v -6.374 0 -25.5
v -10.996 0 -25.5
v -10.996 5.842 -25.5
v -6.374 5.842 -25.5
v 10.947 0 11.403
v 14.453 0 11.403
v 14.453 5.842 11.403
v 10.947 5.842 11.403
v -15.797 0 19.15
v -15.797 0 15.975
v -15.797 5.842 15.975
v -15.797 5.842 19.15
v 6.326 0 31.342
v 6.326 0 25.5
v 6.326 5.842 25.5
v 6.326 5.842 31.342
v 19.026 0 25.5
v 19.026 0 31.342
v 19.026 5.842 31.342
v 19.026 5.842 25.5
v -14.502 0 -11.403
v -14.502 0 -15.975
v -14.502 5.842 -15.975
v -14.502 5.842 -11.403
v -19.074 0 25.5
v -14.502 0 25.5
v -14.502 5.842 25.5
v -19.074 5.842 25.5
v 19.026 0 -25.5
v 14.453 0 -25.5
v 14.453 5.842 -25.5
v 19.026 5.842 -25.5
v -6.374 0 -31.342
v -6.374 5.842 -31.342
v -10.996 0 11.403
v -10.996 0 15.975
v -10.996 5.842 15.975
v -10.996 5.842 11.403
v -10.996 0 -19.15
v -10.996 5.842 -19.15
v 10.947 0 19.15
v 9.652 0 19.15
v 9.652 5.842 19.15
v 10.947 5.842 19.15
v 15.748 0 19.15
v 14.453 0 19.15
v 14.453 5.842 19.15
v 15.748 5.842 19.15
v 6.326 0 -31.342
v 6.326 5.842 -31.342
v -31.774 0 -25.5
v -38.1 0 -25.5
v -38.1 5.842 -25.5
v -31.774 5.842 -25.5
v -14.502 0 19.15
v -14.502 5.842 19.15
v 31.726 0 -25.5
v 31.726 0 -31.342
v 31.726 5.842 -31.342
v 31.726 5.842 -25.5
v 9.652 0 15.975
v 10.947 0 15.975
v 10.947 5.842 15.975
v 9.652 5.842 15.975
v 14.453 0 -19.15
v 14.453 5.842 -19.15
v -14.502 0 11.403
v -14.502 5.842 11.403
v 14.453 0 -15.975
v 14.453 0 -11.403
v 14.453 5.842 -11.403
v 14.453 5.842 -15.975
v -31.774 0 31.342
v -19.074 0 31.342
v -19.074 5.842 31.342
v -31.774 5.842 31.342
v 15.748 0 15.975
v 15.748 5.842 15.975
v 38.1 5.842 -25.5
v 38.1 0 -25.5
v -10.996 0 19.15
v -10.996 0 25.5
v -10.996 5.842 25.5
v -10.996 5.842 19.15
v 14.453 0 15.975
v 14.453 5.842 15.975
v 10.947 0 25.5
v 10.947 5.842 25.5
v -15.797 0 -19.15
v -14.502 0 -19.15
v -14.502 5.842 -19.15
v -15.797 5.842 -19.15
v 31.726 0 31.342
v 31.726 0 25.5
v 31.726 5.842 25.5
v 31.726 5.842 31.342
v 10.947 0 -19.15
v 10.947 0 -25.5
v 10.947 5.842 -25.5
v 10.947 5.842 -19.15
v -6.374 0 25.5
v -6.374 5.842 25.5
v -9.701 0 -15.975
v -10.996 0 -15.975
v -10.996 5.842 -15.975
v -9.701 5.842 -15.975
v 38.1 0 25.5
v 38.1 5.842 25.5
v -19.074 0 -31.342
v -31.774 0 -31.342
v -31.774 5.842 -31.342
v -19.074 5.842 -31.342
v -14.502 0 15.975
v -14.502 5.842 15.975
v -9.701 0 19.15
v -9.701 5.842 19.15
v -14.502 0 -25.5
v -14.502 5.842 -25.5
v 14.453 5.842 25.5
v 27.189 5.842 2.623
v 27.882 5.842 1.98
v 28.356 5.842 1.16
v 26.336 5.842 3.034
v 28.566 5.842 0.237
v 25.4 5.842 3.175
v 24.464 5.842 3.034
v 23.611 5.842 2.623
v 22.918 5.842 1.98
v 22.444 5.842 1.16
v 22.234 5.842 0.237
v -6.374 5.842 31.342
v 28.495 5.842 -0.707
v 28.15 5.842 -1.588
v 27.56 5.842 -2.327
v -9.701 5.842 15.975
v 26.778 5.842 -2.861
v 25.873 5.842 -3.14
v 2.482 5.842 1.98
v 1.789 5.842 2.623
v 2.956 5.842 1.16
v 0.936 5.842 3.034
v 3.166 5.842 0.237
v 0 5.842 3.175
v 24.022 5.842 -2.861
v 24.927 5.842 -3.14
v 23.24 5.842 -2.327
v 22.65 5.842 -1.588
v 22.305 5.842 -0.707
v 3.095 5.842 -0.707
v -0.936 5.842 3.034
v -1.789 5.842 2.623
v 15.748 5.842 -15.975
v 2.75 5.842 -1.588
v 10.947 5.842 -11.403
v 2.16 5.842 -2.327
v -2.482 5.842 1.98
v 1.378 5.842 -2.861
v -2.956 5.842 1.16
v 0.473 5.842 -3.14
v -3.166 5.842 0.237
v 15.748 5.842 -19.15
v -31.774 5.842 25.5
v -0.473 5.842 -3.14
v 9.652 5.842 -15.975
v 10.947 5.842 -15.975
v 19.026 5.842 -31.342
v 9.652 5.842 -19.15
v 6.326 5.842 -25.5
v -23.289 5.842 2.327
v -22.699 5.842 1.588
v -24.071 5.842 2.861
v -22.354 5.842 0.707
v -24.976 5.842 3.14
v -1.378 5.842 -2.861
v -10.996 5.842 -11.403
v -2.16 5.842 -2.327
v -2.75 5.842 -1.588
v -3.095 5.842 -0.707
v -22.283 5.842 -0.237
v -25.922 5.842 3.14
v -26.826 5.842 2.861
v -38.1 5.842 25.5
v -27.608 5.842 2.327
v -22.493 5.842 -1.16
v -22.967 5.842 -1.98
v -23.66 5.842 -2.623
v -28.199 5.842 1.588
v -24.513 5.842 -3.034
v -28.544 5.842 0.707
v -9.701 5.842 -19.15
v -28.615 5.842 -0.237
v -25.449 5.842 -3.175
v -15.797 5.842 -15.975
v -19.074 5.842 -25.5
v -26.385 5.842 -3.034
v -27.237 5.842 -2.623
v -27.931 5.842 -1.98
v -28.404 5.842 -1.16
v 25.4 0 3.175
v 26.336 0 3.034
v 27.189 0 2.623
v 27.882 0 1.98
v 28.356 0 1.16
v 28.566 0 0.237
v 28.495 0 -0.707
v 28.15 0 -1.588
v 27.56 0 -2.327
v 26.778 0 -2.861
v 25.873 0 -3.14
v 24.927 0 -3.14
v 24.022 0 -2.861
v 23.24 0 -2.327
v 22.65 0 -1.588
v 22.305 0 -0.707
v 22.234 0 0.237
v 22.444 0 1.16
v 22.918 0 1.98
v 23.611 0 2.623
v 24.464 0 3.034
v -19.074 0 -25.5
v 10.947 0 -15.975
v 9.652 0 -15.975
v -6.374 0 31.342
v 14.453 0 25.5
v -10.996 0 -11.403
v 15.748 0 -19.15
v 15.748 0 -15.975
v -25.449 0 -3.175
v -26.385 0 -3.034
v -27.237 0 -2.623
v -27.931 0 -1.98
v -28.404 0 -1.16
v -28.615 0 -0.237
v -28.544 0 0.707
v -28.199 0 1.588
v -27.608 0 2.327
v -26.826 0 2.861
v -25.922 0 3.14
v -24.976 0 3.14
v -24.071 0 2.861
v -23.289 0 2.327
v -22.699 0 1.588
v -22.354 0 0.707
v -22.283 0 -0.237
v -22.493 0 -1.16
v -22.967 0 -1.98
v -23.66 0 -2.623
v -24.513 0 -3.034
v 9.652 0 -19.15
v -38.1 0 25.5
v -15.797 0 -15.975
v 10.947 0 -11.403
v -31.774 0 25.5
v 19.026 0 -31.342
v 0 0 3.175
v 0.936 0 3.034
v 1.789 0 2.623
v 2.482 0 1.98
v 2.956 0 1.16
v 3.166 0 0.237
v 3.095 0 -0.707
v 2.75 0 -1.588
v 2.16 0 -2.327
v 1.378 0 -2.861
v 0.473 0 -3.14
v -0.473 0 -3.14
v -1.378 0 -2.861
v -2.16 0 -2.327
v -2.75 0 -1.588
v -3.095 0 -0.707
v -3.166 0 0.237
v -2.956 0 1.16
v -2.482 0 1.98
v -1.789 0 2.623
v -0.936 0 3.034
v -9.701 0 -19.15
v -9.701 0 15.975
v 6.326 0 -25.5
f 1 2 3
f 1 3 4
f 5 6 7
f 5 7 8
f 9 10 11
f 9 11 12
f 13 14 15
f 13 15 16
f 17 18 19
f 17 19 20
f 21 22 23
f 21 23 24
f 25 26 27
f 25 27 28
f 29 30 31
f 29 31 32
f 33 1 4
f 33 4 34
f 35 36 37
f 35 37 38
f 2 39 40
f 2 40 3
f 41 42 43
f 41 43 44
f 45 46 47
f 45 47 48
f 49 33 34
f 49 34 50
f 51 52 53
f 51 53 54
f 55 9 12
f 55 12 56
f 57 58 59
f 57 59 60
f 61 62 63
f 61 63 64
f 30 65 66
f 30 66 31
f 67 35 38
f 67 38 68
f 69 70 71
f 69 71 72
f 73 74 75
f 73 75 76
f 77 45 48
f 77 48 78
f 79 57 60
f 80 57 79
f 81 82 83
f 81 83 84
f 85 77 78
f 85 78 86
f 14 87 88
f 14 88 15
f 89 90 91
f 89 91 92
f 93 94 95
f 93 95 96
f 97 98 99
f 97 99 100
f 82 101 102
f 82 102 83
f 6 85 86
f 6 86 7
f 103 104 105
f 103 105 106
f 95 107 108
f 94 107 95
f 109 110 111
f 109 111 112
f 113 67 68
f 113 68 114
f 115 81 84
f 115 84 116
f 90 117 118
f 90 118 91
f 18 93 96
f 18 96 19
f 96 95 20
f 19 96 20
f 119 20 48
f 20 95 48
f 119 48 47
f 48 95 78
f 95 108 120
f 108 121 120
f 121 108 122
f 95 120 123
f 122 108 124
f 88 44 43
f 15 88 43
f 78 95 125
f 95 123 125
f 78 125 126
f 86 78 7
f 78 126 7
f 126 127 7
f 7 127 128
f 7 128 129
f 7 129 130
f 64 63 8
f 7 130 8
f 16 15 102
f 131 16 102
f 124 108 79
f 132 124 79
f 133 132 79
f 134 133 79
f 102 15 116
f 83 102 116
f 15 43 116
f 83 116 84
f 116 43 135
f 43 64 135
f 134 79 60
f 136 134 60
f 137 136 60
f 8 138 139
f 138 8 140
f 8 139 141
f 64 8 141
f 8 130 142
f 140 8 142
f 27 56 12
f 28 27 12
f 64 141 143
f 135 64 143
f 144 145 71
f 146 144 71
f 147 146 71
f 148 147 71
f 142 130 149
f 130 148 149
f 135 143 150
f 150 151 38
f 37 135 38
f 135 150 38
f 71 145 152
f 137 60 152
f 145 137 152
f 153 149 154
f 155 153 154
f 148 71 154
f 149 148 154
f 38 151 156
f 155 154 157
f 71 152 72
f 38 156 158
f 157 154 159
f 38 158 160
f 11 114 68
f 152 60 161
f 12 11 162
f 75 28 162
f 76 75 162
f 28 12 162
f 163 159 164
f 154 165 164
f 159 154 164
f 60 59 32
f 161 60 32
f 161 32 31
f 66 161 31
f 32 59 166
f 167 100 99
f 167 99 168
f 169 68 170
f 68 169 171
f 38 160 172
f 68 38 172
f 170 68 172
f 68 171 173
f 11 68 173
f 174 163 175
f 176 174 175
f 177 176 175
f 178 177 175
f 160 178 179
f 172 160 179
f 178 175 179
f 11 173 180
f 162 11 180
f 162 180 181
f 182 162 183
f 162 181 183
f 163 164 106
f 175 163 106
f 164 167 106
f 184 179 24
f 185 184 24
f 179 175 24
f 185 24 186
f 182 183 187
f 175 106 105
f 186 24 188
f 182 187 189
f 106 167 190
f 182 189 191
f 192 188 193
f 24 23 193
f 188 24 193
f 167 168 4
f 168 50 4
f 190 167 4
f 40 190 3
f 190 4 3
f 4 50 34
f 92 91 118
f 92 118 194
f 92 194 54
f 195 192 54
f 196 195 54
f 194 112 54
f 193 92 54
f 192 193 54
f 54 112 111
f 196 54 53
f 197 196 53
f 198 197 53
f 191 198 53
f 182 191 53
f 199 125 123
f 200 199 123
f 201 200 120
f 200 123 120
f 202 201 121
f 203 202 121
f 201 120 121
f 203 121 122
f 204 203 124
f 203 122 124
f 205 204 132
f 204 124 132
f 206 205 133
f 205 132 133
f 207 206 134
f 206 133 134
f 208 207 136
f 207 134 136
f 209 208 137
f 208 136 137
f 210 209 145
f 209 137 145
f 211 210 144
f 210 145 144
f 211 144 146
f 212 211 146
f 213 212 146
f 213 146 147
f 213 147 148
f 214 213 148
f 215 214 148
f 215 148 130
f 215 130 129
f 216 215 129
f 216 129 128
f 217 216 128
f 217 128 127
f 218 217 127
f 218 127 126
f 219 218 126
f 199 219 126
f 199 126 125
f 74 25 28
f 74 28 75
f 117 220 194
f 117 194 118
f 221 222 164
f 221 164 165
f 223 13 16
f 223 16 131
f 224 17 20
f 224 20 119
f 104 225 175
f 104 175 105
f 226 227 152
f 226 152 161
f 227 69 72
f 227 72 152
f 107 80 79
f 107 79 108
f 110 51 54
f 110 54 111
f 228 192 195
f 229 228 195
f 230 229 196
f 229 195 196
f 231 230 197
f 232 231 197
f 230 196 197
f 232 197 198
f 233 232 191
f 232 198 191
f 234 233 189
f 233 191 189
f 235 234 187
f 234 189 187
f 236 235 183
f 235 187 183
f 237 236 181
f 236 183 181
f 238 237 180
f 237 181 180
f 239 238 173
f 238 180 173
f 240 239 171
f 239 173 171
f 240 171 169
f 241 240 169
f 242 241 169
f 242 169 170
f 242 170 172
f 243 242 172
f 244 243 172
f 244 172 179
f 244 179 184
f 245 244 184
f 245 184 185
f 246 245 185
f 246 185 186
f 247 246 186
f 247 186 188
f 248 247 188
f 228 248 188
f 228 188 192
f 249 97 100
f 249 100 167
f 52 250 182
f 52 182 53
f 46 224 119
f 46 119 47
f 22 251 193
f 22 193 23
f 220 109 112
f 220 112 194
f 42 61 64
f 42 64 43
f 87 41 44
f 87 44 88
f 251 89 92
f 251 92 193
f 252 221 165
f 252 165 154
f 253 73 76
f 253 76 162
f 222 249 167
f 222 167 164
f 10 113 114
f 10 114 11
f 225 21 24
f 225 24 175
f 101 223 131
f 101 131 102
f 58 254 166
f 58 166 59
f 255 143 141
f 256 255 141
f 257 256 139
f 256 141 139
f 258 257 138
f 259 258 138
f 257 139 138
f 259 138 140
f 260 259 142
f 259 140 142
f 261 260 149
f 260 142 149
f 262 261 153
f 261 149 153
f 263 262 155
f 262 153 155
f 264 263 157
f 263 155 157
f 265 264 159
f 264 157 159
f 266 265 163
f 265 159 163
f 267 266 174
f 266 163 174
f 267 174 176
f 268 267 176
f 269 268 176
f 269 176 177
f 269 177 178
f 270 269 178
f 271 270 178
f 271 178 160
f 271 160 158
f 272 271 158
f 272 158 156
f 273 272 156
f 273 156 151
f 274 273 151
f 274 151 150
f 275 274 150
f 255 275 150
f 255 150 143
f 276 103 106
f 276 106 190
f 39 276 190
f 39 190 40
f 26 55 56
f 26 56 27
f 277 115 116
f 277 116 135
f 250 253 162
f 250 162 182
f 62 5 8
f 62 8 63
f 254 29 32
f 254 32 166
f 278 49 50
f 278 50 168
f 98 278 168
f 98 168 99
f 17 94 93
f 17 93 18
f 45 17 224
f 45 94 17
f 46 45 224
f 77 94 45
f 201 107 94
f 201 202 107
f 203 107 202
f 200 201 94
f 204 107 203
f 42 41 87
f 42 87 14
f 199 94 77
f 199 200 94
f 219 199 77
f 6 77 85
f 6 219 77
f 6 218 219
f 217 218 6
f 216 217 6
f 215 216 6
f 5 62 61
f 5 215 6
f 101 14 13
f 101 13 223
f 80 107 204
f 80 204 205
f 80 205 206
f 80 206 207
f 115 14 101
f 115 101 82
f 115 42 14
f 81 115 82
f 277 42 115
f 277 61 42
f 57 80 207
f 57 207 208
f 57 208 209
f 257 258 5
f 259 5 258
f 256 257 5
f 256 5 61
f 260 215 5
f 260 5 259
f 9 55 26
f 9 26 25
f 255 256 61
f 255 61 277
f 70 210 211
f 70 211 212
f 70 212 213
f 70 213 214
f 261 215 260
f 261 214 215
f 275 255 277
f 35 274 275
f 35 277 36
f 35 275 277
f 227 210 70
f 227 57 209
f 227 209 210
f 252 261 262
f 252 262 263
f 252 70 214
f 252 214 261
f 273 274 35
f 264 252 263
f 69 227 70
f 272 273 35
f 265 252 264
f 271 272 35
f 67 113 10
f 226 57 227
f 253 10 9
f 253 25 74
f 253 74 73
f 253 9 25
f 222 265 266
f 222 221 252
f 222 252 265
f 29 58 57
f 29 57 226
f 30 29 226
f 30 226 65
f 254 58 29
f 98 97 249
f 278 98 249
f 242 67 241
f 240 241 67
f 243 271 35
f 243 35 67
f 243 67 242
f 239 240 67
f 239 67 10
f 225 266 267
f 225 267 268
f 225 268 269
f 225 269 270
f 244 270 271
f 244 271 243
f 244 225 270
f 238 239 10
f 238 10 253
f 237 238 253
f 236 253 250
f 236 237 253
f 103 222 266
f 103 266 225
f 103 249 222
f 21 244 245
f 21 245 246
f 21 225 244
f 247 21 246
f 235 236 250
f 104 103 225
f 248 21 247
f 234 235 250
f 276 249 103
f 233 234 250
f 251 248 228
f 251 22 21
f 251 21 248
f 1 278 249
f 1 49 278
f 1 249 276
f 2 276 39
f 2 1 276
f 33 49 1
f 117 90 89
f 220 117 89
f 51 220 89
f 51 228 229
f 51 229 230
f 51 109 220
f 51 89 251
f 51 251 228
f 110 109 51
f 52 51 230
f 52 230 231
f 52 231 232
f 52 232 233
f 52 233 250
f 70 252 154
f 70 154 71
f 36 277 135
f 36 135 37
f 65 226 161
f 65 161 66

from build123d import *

# Parameters (mm, degrees)
BOSS_EXTRUDE1_DEPTH = 5.842
SKETCH2_R           = 3.175
CUT_EXTRUDE1_DEPTH  = 50.679572542


with BuildPart() as part:
    # Sketch1 → Boss-Extrude1 (new body)
    with BuildSketch(Plane(origin=(0, 0, 0), x_dir=(1, 0, 0), z_dir=(0, 1, 0))):
        Polygon((38.1, -25.5), (31.725545431, -25.5), (31.725545431, -31.342), (19.025545431, -31.342), (19.025545431, -25.5), (14.4526, -25.5), (14.4526, -19.15), (15.748, -19.15), (15.748, -15.975), (14.4526, -15.975), (14.4526, -11.403), (10.9474, -11.403), (10.9474, -15.975), (9.652, -15.975), (9.652, -19.15), (10.9474, -19.15), (10.9474, -25.5), (6.325545431, -25.5), (6.325545431, -31.342), (-6.374454569, -31.342), (-6.374454569, -25.5), (-10.996309138, -25.5), (-10.996309138, -19.15), (-9.700909138, -19.15), (-9.700909138, -15.975), (-10.996309138, -15.975), (-10.996309138, -11.403), (-14.501509138, -11.403), (-14.501509138, -15.975), (-15.796909138, -15.975), (-15.796909138, -19.15), (-14.501509138, -19.15), (-14.501509138, -25.5), (-19.074454569, -25.5), (-19.074454569, -31.342), (-31.774454569, -31.342), (-31.774454569, -25.5), (-38.1, -25.5), (-38.1, 25.5), (-31.774454569, 25.5), (-31.774454569, 31.342), (-19.074454569, 31.342), (-19.074454569, 25.5), (-14.501509138, 25.5), (-14.501509138, 19.15), (-15.796909138, 19.15), (-15.796909138, 15.975), (-14.501509138, 15.975), (-14.501509138, 11.403), (-10.996309138, 11.403), (-10.996309138, 15.975), (-9.700909138, 15.975), (-9.700909138, 19.15), (-10.996309138, 19.15), (-10.996309138, 25.5), (-6.374454569, 25.5), (-6.374454569, 31.342), (6.325545431, 31.342), (6.325545431, 25.5), (10.9474, 25.5), (10.9474, 19.15), (9.652, 19.15), (9.652, 15.975), (10.9474, 15.975), (10.9474, 11.403), (14.4526, 11.403), (14.4526, 15.975), (15.748, 15.975), (15.748, 19.15), (14.4526, 19.15), (14.4526, 25.5), (19.025545431, 25.5), (19.025545431, 31.342), (31.725545431, 31.342), (31.725545431, 25.5), (38.1, 25.5), align=None)
    extrude(amount=BOSS_EXTRUDE1_DEPTH)

    # Sketch2 → Cut-Extrude1 (cut, through all)
    with BuildSketch(Plane(origin=(0, 5.842, 0), x_dir=(1, 0, 0), z_dir=(0, 1, 0))):
        with Locations(Location((0, 0, 0), (0, 0, 270))):
            Circle(SKETCH2_R)
        with Locations(Location((25.4, 0, 0), (0, 0, 270))):
            Circle(SKETCH2_R)
        with Locations(Location((-25.448909138, 0, 0), (0, 0, 90))):
            Circle(SKETCH2_R)
    extrude(amount=-CUT_EXTRUDE1_DEPTH, mode=Mode.SUBTRACT)


solid = part.part
